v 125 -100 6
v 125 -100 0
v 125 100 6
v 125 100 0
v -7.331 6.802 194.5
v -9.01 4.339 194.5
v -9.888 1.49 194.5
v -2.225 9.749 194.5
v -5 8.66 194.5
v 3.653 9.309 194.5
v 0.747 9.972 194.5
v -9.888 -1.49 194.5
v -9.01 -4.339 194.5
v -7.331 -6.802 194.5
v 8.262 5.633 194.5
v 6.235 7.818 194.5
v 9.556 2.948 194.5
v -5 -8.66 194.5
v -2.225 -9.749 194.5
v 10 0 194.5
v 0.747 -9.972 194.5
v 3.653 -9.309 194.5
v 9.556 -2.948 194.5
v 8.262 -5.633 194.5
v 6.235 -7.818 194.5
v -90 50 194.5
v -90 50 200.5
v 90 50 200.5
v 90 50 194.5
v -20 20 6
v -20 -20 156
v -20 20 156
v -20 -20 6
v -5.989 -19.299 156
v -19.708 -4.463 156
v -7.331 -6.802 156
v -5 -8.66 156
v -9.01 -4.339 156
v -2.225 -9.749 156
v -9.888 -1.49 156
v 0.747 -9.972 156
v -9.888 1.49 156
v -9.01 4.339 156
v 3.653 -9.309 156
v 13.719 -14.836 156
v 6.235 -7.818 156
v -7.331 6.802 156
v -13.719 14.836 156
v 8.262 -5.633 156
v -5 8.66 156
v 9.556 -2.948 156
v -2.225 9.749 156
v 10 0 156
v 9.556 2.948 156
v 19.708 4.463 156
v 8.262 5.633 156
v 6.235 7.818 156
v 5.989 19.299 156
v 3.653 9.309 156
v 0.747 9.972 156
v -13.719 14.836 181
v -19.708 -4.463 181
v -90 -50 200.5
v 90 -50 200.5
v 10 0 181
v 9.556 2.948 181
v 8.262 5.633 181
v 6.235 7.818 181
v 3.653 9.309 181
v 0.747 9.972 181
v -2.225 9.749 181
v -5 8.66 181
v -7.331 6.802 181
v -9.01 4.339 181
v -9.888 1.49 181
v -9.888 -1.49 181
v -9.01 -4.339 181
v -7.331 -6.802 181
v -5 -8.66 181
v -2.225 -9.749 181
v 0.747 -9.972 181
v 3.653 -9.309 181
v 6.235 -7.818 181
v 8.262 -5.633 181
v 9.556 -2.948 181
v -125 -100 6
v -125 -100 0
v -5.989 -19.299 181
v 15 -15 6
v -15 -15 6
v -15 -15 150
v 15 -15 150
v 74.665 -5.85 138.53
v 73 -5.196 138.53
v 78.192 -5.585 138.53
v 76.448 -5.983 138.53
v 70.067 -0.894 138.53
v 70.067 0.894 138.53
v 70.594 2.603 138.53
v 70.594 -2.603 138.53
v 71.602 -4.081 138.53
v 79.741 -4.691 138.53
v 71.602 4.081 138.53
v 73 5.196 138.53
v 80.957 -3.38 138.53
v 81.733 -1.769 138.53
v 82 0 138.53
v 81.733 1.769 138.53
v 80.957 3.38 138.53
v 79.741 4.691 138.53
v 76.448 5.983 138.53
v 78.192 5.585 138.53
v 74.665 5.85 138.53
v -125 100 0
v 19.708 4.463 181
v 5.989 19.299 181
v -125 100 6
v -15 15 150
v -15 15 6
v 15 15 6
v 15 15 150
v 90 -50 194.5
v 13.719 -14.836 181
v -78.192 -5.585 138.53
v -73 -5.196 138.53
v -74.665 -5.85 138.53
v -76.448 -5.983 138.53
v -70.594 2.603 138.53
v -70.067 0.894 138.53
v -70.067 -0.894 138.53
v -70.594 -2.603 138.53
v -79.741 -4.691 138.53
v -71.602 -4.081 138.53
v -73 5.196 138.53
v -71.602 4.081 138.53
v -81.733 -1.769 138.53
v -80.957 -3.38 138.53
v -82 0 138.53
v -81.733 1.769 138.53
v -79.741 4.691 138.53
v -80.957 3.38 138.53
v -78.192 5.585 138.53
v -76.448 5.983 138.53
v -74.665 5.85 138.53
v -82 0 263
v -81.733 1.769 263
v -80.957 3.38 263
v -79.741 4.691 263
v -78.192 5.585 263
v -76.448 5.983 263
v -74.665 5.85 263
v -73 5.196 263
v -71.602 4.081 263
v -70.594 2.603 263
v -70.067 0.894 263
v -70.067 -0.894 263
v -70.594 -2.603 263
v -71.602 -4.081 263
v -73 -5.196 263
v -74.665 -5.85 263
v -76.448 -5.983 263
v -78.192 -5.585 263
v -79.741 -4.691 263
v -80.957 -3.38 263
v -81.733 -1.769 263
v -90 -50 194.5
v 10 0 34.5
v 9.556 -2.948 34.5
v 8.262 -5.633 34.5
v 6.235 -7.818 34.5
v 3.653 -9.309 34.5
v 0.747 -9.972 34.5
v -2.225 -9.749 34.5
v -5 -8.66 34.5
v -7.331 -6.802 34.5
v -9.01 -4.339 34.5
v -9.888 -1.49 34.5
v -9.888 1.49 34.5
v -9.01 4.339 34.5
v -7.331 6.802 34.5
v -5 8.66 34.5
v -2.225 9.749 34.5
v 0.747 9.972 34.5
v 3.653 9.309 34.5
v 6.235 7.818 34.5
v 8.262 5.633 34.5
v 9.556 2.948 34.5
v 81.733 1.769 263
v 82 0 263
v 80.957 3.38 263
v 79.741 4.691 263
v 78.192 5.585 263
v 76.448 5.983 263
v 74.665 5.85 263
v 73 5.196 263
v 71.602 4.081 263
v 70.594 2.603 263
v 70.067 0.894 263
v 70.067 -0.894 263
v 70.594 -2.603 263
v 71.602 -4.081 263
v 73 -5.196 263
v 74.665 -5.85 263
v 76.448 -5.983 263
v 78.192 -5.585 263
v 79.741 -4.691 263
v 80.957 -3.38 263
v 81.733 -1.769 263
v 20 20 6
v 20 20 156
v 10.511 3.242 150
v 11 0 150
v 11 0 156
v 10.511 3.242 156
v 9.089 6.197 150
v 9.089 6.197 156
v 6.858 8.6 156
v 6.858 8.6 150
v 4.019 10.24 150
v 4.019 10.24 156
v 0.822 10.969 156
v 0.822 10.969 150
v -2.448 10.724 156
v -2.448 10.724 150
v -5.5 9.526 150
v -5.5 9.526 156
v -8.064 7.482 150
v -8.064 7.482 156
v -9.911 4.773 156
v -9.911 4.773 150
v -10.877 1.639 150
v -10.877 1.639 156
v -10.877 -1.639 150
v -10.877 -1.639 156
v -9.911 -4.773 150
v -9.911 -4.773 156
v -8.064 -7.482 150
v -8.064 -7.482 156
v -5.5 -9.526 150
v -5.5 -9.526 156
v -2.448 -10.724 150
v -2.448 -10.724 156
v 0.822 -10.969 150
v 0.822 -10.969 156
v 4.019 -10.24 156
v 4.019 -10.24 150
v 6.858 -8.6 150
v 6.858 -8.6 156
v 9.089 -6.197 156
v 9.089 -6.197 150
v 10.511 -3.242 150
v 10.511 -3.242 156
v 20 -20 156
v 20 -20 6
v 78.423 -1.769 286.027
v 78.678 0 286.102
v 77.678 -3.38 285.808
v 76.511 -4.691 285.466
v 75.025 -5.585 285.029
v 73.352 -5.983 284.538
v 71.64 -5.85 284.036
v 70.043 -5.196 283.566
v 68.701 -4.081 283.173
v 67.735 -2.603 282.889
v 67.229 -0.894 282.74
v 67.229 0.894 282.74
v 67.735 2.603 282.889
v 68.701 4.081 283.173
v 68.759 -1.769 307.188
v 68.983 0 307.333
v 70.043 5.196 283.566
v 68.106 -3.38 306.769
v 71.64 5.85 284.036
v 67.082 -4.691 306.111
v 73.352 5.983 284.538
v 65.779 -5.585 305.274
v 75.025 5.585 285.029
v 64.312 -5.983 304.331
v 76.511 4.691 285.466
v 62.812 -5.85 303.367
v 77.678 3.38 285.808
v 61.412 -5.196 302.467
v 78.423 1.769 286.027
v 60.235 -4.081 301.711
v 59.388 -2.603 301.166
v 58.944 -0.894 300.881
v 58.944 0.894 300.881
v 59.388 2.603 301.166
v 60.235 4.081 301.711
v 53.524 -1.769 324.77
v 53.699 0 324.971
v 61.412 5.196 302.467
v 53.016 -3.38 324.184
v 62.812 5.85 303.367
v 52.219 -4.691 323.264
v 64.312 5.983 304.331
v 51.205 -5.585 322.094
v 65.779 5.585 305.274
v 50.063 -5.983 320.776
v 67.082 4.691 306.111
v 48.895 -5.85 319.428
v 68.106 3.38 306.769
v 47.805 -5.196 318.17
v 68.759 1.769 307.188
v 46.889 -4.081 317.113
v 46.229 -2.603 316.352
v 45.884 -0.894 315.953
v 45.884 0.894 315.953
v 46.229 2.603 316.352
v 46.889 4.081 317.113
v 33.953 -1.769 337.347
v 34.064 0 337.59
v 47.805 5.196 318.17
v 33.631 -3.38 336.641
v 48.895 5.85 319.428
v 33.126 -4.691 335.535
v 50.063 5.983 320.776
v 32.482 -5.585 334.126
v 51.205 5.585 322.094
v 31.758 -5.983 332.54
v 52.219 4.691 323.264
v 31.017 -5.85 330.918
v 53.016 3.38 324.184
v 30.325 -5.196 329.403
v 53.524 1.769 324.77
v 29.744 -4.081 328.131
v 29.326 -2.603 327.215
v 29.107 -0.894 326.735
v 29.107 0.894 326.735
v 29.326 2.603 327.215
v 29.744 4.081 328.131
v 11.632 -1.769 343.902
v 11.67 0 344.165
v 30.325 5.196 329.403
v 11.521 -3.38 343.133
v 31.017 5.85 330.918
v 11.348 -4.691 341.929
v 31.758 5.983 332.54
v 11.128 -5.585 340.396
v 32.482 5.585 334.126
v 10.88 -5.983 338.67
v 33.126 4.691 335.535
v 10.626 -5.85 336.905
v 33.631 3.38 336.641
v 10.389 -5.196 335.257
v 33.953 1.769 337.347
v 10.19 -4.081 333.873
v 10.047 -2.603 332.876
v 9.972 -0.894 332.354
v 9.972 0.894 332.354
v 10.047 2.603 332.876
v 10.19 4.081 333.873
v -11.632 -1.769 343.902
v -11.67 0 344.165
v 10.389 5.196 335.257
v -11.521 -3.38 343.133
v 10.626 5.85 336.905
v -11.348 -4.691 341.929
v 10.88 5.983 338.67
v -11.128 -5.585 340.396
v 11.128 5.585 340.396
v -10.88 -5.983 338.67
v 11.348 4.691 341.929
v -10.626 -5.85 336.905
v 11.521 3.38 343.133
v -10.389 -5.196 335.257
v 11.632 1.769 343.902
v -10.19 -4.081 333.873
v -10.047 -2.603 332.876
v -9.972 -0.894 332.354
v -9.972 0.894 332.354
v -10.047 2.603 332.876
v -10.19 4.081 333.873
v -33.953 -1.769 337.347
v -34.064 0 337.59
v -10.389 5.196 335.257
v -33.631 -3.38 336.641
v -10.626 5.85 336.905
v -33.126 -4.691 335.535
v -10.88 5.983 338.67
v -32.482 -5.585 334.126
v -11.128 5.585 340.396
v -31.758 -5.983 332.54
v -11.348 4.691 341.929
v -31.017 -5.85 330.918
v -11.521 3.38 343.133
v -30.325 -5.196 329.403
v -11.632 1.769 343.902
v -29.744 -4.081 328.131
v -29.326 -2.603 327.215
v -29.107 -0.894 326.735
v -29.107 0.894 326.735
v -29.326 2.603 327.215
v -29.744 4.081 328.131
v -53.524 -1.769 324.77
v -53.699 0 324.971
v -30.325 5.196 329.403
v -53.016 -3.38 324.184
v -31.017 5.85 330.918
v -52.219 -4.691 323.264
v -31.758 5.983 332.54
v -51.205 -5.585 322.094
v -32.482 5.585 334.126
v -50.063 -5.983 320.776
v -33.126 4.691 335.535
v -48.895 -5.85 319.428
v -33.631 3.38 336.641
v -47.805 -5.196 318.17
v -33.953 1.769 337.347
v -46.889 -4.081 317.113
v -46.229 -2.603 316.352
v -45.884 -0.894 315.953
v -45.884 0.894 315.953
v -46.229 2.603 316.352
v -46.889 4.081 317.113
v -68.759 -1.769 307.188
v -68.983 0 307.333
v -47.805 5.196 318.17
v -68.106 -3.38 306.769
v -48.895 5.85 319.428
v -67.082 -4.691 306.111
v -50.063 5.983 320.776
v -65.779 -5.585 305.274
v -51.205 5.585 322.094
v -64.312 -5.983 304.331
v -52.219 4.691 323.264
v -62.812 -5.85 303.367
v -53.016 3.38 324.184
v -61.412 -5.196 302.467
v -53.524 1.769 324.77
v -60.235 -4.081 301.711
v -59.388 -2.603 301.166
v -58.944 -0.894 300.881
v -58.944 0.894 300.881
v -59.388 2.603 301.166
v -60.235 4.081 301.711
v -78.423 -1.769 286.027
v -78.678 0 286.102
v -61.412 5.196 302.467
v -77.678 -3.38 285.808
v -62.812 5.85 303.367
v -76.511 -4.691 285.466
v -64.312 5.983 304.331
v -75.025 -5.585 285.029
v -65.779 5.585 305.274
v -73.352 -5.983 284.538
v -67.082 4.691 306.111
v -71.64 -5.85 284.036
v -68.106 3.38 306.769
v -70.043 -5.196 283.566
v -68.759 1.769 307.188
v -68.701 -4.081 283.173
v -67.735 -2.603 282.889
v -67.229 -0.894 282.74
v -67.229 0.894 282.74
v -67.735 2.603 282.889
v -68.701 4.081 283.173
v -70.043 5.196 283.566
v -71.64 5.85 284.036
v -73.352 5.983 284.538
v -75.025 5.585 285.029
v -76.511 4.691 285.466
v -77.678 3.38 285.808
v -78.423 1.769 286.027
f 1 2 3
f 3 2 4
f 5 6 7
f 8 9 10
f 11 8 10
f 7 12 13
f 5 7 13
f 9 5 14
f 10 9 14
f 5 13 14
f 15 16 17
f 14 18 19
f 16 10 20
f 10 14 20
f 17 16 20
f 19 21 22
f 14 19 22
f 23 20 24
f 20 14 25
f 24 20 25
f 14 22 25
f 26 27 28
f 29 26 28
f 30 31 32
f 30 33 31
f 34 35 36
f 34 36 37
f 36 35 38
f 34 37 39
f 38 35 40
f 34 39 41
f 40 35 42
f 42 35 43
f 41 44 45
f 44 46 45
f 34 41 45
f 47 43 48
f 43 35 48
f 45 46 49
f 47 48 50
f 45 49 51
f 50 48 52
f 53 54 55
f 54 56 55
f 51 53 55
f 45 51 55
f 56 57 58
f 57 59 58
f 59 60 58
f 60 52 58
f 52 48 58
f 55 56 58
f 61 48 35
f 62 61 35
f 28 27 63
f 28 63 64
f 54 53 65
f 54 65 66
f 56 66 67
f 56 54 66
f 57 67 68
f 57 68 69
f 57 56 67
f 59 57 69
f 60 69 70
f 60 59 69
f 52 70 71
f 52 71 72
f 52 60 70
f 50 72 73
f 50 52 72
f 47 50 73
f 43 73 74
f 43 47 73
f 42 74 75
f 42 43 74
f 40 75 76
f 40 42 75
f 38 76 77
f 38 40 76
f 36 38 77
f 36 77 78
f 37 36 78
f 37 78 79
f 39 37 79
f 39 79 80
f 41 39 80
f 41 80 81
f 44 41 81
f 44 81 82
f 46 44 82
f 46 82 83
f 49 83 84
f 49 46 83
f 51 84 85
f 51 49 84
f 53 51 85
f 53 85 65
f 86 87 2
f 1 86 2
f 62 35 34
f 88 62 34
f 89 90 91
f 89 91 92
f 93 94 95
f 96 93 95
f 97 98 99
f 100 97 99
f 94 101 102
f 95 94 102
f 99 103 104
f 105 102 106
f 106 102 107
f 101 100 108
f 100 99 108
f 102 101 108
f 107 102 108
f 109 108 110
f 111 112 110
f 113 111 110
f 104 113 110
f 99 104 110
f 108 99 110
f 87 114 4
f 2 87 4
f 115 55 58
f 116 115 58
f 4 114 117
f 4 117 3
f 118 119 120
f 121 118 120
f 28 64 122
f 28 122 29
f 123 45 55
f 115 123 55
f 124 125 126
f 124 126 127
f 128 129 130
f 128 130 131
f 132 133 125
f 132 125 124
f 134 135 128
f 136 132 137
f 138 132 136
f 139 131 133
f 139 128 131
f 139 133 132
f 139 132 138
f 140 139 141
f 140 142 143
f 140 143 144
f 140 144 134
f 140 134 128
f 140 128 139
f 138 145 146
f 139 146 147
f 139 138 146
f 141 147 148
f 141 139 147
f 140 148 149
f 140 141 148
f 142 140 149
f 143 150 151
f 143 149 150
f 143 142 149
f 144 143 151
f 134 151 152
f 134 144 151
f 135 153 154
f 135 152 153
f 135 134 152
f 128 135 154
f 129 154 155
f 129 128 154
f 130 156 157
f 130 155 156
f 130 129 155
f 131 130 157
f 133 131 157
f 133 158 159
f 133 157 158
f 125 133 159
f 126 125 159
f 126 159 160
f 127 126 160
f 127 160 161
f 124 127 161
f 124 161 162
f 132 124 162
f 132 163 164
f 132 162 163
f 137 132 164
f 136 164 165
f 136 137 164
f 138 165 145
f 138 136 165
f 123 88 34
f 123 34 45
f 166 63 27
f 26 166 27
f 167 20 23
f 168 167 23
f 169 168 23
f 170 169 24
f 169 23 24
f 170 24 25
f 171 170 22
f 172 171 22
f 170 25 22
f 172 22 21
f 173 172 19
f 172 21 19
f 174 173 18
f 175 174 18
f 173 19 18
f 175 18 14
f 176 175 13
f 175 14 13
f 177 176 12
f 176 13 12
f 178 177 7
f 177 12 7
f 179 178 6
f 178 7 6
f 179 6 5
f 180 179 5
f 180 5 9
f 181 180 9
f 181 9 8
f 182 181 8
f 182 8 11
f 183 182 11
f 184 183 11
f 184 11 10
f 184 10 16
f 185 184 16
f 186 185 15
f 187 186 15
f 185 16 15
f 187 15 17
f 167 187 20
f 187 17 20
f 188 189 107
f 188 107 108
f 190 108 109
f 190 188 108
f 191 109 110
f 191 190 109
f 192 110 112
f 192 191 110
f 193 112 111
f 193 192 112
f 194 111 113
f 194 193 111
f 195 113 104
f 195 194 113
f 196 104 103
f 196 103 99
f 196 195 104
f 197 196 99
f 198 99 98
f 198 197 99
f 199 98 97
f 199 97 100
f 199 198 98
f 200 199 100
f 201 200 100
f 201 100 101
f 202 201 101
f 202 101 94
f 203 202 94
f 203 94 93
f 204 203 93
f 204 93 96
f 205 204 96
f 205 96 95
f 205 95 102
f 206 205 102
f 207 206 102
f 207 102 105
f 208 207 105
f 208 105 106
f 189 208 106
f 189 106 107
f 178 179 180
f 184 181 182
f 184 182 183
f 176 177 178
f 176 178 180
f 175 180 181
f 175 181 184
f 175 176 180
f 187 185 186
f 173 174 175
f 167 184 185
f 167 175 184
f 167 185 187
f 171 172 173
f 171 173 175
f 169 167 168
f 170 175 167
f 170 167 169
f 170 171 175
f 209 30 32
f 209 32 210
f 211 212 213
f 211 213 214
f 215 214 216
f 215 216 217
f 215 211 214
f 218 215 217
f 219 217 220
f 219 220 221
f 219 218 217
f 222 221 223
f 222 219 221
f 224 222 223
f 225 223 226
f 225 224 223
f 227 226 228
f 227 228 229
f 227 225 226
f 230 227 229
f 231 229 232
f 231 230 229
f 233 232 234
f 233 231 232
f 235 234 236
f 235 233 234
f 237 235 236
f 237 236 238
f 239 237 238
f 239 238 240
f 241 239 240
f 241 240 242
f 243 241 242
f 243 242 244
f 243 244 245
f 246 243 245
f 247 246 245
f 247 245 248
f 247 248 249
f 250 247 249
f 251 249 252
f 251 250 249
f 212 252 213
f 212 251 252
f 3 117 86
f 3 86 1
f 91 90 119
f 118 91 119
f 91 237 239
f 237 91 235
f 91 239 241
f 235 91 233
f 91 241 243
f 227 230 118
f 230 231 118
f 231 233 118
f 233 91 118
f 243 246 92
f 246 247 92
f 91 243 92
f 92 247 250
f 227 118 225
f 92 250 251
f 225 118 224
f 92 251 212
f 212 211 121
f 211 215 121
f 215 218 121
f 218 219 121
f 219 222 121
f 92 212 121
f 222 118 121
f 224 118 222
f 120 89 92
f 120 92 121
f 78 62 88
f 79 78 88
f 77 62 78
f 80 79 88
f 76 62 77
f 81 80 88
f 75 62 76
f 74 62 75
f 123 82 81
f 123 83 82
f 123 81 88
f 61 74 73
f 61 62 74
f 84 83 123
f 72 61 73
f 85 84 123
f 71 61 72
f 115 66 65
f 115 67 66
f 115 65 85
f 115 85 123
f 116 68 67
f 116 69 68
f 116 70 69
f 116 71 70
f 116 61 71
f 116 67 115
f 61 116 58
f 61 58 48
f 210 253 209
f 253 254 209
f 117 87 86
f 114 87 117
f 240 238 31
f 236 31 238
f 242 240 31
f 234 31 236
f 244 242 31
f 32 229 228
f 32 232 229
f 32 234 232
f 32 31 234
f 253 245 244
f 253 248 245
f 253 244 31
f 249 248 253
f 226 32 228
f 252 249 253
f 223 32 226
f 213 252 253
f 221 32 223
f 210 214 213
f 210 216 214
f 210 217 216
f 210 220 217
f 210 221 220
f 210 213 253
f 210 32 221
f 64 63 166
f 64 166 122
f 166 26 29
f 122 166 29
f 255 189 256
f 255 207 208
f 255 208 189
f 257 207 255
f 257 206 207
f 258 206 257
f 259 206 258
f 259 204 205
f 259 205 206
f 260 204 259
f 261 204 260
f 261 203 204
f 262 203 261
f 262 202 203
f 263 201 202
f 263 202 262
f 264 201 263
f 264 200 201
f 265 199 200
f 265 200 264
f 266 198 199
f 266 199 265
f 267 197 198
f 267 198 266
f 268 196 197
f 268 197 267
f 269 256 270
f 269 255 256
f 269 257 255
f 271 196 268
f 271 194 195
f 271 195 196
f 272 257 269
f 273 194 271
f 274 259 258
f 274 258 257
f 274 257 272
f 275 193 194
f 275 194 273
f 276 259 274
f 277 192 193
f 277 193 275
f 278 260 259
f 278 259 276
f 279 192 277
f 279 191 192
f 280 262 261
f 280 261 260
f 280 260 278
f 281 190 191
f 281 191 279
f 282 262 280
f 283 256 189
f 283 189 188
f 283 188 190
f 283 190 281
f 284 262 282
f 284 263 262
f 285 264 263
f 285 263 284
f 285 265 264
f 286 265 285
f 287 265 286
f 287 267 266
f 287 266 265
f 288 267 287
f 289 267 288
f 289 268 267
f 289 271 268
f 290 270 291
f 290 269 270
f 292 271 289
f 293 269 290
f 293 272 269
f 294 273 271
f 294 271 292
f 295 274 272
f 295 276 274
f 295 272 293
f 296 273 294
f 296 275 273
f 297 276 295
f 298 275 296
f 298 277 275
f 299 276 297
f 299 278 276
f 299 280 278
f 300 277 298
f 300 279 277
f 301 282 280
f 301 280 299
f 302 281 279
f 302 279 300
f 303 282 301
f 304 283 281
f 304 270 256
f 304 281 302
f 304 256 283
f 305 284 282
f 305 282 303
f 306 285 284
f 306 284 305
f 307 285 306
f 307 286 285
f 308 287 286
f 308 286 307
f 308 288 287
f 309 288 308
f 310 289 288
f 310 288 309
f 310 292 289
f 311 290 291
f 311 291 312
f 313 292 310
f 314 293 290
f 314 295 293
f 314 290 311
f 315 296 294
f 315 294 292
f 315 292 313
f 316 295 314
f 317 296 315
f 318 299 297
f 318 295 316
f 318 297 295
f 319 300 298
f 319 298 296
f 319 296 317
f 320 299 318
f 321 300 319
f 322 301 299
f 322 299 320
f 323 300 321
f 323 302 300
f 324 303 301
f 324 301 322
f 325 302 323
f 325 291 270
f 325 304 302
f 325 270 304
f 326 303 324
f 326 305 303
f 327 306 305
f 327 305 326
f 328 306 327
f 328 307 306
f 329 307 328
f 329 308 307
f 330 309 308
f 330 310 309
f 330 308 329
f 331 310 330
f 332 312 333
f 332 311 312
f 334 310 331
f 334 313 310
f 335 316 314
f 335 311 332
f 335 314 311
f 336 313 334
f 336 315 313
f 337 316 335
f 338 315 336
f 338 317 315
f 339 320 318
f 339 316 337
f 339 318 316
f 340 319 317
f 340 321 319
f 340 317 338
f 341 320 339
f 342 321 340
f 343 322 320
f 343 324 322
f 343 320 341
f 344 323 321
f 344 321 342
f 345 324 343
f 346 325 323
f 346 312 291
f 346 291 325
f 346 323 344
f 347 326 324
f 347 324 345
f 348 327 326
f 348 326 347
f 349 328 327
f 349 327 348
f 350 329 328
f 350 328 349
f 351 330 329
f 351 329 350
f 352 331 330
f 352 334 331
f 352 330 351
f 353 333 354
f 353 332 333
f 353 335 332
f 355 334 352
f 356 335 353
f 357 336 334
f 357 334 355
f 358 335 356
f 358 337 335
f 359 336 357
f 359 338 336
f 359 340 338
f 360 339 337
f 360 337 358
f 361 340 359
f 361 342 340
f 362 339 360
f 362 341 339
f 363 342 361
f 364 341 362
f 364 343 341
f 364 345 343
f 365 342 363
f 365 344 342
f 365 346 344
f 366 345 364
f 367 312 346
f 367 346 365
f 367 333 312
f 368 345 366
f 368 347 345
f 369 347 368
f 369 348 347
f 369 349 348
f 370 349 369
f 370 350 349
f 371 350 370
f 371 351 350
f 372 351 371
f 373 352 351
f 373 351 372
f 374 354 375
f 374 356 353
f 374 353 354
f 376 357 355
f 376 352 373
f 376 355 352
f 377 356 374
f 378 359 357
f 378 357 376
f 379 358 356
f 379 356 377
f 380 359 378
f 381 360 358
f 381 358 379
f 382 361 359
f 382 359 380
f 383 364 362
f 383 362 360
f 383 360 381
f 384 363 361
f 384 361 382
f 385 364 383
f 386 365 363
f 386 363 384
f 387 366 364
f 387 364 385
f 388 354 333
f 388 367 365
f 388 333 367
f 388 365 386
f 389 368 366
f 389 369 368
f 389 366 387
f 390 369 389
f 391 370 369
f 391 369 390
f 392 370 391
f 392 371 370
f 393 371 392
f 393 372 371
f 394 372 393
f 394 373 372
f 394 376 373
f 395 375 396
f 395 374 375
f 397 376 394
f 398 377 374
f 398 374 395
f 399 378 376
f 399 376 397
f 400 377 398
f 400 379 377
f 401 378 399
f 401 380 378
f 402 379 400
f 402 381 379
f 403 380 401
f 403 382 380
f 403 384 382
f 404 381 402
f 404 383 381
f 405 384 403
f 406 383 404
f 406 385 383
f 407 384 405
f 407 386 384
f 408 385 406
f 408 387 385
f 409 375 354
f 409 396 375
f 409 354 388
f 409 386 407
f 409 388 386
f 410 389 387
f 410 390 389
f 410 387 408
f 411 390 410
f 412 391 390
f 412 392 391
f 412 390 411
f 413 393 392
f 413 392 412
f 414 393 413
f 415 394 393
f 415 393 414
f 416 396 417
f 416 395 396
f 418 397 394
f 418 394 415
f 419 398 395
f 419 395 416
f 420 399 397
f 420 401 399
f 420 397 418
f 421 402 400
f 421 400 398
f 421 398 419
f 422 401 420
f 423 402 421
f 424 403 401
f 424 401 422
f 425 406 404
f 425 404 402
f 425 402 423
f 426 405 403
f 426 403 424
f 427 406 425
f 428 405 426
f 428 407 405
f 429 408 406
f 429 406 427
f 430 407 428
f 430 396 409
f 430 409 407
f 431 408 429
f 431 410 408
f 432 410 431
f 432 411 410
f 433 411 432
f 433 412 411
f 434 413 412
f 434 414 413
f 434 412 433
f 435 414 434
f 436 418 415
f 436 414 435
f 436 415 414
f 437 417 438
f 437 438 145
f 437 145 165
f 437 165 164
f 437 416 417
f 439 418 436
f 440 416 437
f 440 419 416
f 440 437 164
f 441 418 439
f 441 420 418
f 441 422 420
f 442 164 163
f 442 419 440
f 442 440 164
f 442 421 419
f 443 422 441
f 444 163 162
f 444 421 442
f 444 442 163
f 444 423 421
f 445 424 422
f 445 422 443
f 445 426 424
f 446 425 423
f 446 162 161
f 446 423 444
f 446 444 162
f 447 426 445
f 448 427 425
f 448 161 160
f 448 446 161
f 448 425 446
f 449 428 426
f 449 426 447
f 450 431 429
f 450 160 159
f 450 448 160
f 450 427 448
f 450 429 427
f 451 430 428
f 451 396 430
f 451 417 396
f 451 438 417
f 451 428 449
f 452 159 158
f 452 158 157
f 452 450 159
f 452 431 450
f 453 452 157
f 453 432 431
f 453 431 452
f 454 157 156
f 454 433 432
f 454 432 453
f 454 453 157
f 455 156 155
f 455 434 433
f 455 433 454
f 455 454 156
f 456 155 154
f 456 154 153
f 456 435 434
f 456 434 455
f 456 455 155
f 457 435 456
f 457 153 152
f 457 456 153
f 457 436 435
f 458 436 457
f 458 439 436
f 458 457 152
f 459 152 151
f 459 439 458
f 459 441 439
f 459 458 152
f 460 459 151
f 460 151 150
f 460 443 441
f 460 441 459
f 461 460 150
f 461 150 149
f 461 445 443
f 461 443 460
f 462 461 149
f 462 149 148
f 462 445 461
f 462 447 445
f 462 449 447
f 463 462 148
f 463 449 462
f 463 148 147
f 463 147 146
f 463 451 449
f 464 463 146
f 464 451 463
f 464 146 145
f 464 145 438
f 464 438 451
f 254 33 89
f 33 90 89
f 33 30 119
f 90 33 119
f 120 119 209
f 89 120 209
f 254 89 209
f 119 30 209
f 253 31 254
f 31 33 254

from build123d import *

# Parameters (mm, degrees)
F0_W      = 250
F0_H      = 200
F1_DEPTH  = 6
F2_W      = 40
F2_H      = 40
F2_W_2    = 30
F2_H_2    = 30
F3_DEPTH  = 144
F4_W      = 40
F4_H      = 40
F4_R      = 11
F5_DEPTH  = 6
F7_W      = 180
F7_H      = 100
F8_DEPTH  = 6
F9_R      = 10
F10_DEPTH = 160
F13_R     = 6
F15_R     = 10
F16_DEPTH = 25


with BuildPart() as f1:
    # F0 (on Top) → F1 (new body)
    with BuildSketch(Plane.XY):
        Rectangle(F0_W, F0_H)
    extrude(amount=F1_DEPTH)


with BuildPart() as f3:
    # F2 (on face) → F3 (new body)
    with BuildSketch(Plane.XY.offset(6)):
        Rectangle(F2_W, F2_H)
        Rectangle(F2_W_2, F2_H_2, mode=Mode.SUBTRACT)
    extrude(amount=F3_DEPTH)

    # F4 (on face) → F5 (join)
    with BuildSketch(Plane.XY.offset(150)):
        Rectangle(F4_W, F4_H)
        Circle(F4_R, mode=Mode.SUBTRACT)
    extrude(amount=F5_DEPTH)


with BuildPart() as f8:
    # F7 (on offset) → F8 (new body)
    with BuildSketch(Plane.XY.offset(200.5)):
        Rectangle(F7_W, F7_H)
    extrude(amount=-F8_DEPTH)


with BuildPart() as f10:
    # F9 (on face) → F10 (new body)
    with BuildSketch(Plane(origin=(0, 0, 194.5), x_dir=(1, 0, 0), z_dir=(0, 0, -1))):
        Circle(F9_R)
    extrude(amount=F10_DEPTH)


with BuildPart() as f14:
    # F14: sweep along a path in F11
    with BuildLine(Plane.XZ) as f14_path:
        Line((76, 138.53), (76, 263))
        ThreePointArc((76, 263), (0, 339), (-76, 263))
        Line((-76, 263), (-76, 138.53))
    # F13 (on offset) → F14 (sweep)
    with BuildSketch(Plane.XY.offset(138.53)):
        with Locations((76, 0)):
            Circle(F13_R)
    sweep(path=f14_path.line)


with BuildPart() as f16:
    # F15 (on face) → F16 (new body)
    with BuildSketch(Plane.XY.offset(156)):
        Polygon((-19.708174, -4.46332), (-5.988738, -19.299439), (13.719436, -14.836119), (19.708174, 4.46332), (5.988738, 19.299439), (-13.719436, 14.836119), align=None)
        Circle(F15_R, mode=Mode.SUBTRACT)
    extrude(amount=F16_DEPTH)


solid = Compound([f1.part, f3.part, f8.part, f10.part, f14.part, f16.part])
